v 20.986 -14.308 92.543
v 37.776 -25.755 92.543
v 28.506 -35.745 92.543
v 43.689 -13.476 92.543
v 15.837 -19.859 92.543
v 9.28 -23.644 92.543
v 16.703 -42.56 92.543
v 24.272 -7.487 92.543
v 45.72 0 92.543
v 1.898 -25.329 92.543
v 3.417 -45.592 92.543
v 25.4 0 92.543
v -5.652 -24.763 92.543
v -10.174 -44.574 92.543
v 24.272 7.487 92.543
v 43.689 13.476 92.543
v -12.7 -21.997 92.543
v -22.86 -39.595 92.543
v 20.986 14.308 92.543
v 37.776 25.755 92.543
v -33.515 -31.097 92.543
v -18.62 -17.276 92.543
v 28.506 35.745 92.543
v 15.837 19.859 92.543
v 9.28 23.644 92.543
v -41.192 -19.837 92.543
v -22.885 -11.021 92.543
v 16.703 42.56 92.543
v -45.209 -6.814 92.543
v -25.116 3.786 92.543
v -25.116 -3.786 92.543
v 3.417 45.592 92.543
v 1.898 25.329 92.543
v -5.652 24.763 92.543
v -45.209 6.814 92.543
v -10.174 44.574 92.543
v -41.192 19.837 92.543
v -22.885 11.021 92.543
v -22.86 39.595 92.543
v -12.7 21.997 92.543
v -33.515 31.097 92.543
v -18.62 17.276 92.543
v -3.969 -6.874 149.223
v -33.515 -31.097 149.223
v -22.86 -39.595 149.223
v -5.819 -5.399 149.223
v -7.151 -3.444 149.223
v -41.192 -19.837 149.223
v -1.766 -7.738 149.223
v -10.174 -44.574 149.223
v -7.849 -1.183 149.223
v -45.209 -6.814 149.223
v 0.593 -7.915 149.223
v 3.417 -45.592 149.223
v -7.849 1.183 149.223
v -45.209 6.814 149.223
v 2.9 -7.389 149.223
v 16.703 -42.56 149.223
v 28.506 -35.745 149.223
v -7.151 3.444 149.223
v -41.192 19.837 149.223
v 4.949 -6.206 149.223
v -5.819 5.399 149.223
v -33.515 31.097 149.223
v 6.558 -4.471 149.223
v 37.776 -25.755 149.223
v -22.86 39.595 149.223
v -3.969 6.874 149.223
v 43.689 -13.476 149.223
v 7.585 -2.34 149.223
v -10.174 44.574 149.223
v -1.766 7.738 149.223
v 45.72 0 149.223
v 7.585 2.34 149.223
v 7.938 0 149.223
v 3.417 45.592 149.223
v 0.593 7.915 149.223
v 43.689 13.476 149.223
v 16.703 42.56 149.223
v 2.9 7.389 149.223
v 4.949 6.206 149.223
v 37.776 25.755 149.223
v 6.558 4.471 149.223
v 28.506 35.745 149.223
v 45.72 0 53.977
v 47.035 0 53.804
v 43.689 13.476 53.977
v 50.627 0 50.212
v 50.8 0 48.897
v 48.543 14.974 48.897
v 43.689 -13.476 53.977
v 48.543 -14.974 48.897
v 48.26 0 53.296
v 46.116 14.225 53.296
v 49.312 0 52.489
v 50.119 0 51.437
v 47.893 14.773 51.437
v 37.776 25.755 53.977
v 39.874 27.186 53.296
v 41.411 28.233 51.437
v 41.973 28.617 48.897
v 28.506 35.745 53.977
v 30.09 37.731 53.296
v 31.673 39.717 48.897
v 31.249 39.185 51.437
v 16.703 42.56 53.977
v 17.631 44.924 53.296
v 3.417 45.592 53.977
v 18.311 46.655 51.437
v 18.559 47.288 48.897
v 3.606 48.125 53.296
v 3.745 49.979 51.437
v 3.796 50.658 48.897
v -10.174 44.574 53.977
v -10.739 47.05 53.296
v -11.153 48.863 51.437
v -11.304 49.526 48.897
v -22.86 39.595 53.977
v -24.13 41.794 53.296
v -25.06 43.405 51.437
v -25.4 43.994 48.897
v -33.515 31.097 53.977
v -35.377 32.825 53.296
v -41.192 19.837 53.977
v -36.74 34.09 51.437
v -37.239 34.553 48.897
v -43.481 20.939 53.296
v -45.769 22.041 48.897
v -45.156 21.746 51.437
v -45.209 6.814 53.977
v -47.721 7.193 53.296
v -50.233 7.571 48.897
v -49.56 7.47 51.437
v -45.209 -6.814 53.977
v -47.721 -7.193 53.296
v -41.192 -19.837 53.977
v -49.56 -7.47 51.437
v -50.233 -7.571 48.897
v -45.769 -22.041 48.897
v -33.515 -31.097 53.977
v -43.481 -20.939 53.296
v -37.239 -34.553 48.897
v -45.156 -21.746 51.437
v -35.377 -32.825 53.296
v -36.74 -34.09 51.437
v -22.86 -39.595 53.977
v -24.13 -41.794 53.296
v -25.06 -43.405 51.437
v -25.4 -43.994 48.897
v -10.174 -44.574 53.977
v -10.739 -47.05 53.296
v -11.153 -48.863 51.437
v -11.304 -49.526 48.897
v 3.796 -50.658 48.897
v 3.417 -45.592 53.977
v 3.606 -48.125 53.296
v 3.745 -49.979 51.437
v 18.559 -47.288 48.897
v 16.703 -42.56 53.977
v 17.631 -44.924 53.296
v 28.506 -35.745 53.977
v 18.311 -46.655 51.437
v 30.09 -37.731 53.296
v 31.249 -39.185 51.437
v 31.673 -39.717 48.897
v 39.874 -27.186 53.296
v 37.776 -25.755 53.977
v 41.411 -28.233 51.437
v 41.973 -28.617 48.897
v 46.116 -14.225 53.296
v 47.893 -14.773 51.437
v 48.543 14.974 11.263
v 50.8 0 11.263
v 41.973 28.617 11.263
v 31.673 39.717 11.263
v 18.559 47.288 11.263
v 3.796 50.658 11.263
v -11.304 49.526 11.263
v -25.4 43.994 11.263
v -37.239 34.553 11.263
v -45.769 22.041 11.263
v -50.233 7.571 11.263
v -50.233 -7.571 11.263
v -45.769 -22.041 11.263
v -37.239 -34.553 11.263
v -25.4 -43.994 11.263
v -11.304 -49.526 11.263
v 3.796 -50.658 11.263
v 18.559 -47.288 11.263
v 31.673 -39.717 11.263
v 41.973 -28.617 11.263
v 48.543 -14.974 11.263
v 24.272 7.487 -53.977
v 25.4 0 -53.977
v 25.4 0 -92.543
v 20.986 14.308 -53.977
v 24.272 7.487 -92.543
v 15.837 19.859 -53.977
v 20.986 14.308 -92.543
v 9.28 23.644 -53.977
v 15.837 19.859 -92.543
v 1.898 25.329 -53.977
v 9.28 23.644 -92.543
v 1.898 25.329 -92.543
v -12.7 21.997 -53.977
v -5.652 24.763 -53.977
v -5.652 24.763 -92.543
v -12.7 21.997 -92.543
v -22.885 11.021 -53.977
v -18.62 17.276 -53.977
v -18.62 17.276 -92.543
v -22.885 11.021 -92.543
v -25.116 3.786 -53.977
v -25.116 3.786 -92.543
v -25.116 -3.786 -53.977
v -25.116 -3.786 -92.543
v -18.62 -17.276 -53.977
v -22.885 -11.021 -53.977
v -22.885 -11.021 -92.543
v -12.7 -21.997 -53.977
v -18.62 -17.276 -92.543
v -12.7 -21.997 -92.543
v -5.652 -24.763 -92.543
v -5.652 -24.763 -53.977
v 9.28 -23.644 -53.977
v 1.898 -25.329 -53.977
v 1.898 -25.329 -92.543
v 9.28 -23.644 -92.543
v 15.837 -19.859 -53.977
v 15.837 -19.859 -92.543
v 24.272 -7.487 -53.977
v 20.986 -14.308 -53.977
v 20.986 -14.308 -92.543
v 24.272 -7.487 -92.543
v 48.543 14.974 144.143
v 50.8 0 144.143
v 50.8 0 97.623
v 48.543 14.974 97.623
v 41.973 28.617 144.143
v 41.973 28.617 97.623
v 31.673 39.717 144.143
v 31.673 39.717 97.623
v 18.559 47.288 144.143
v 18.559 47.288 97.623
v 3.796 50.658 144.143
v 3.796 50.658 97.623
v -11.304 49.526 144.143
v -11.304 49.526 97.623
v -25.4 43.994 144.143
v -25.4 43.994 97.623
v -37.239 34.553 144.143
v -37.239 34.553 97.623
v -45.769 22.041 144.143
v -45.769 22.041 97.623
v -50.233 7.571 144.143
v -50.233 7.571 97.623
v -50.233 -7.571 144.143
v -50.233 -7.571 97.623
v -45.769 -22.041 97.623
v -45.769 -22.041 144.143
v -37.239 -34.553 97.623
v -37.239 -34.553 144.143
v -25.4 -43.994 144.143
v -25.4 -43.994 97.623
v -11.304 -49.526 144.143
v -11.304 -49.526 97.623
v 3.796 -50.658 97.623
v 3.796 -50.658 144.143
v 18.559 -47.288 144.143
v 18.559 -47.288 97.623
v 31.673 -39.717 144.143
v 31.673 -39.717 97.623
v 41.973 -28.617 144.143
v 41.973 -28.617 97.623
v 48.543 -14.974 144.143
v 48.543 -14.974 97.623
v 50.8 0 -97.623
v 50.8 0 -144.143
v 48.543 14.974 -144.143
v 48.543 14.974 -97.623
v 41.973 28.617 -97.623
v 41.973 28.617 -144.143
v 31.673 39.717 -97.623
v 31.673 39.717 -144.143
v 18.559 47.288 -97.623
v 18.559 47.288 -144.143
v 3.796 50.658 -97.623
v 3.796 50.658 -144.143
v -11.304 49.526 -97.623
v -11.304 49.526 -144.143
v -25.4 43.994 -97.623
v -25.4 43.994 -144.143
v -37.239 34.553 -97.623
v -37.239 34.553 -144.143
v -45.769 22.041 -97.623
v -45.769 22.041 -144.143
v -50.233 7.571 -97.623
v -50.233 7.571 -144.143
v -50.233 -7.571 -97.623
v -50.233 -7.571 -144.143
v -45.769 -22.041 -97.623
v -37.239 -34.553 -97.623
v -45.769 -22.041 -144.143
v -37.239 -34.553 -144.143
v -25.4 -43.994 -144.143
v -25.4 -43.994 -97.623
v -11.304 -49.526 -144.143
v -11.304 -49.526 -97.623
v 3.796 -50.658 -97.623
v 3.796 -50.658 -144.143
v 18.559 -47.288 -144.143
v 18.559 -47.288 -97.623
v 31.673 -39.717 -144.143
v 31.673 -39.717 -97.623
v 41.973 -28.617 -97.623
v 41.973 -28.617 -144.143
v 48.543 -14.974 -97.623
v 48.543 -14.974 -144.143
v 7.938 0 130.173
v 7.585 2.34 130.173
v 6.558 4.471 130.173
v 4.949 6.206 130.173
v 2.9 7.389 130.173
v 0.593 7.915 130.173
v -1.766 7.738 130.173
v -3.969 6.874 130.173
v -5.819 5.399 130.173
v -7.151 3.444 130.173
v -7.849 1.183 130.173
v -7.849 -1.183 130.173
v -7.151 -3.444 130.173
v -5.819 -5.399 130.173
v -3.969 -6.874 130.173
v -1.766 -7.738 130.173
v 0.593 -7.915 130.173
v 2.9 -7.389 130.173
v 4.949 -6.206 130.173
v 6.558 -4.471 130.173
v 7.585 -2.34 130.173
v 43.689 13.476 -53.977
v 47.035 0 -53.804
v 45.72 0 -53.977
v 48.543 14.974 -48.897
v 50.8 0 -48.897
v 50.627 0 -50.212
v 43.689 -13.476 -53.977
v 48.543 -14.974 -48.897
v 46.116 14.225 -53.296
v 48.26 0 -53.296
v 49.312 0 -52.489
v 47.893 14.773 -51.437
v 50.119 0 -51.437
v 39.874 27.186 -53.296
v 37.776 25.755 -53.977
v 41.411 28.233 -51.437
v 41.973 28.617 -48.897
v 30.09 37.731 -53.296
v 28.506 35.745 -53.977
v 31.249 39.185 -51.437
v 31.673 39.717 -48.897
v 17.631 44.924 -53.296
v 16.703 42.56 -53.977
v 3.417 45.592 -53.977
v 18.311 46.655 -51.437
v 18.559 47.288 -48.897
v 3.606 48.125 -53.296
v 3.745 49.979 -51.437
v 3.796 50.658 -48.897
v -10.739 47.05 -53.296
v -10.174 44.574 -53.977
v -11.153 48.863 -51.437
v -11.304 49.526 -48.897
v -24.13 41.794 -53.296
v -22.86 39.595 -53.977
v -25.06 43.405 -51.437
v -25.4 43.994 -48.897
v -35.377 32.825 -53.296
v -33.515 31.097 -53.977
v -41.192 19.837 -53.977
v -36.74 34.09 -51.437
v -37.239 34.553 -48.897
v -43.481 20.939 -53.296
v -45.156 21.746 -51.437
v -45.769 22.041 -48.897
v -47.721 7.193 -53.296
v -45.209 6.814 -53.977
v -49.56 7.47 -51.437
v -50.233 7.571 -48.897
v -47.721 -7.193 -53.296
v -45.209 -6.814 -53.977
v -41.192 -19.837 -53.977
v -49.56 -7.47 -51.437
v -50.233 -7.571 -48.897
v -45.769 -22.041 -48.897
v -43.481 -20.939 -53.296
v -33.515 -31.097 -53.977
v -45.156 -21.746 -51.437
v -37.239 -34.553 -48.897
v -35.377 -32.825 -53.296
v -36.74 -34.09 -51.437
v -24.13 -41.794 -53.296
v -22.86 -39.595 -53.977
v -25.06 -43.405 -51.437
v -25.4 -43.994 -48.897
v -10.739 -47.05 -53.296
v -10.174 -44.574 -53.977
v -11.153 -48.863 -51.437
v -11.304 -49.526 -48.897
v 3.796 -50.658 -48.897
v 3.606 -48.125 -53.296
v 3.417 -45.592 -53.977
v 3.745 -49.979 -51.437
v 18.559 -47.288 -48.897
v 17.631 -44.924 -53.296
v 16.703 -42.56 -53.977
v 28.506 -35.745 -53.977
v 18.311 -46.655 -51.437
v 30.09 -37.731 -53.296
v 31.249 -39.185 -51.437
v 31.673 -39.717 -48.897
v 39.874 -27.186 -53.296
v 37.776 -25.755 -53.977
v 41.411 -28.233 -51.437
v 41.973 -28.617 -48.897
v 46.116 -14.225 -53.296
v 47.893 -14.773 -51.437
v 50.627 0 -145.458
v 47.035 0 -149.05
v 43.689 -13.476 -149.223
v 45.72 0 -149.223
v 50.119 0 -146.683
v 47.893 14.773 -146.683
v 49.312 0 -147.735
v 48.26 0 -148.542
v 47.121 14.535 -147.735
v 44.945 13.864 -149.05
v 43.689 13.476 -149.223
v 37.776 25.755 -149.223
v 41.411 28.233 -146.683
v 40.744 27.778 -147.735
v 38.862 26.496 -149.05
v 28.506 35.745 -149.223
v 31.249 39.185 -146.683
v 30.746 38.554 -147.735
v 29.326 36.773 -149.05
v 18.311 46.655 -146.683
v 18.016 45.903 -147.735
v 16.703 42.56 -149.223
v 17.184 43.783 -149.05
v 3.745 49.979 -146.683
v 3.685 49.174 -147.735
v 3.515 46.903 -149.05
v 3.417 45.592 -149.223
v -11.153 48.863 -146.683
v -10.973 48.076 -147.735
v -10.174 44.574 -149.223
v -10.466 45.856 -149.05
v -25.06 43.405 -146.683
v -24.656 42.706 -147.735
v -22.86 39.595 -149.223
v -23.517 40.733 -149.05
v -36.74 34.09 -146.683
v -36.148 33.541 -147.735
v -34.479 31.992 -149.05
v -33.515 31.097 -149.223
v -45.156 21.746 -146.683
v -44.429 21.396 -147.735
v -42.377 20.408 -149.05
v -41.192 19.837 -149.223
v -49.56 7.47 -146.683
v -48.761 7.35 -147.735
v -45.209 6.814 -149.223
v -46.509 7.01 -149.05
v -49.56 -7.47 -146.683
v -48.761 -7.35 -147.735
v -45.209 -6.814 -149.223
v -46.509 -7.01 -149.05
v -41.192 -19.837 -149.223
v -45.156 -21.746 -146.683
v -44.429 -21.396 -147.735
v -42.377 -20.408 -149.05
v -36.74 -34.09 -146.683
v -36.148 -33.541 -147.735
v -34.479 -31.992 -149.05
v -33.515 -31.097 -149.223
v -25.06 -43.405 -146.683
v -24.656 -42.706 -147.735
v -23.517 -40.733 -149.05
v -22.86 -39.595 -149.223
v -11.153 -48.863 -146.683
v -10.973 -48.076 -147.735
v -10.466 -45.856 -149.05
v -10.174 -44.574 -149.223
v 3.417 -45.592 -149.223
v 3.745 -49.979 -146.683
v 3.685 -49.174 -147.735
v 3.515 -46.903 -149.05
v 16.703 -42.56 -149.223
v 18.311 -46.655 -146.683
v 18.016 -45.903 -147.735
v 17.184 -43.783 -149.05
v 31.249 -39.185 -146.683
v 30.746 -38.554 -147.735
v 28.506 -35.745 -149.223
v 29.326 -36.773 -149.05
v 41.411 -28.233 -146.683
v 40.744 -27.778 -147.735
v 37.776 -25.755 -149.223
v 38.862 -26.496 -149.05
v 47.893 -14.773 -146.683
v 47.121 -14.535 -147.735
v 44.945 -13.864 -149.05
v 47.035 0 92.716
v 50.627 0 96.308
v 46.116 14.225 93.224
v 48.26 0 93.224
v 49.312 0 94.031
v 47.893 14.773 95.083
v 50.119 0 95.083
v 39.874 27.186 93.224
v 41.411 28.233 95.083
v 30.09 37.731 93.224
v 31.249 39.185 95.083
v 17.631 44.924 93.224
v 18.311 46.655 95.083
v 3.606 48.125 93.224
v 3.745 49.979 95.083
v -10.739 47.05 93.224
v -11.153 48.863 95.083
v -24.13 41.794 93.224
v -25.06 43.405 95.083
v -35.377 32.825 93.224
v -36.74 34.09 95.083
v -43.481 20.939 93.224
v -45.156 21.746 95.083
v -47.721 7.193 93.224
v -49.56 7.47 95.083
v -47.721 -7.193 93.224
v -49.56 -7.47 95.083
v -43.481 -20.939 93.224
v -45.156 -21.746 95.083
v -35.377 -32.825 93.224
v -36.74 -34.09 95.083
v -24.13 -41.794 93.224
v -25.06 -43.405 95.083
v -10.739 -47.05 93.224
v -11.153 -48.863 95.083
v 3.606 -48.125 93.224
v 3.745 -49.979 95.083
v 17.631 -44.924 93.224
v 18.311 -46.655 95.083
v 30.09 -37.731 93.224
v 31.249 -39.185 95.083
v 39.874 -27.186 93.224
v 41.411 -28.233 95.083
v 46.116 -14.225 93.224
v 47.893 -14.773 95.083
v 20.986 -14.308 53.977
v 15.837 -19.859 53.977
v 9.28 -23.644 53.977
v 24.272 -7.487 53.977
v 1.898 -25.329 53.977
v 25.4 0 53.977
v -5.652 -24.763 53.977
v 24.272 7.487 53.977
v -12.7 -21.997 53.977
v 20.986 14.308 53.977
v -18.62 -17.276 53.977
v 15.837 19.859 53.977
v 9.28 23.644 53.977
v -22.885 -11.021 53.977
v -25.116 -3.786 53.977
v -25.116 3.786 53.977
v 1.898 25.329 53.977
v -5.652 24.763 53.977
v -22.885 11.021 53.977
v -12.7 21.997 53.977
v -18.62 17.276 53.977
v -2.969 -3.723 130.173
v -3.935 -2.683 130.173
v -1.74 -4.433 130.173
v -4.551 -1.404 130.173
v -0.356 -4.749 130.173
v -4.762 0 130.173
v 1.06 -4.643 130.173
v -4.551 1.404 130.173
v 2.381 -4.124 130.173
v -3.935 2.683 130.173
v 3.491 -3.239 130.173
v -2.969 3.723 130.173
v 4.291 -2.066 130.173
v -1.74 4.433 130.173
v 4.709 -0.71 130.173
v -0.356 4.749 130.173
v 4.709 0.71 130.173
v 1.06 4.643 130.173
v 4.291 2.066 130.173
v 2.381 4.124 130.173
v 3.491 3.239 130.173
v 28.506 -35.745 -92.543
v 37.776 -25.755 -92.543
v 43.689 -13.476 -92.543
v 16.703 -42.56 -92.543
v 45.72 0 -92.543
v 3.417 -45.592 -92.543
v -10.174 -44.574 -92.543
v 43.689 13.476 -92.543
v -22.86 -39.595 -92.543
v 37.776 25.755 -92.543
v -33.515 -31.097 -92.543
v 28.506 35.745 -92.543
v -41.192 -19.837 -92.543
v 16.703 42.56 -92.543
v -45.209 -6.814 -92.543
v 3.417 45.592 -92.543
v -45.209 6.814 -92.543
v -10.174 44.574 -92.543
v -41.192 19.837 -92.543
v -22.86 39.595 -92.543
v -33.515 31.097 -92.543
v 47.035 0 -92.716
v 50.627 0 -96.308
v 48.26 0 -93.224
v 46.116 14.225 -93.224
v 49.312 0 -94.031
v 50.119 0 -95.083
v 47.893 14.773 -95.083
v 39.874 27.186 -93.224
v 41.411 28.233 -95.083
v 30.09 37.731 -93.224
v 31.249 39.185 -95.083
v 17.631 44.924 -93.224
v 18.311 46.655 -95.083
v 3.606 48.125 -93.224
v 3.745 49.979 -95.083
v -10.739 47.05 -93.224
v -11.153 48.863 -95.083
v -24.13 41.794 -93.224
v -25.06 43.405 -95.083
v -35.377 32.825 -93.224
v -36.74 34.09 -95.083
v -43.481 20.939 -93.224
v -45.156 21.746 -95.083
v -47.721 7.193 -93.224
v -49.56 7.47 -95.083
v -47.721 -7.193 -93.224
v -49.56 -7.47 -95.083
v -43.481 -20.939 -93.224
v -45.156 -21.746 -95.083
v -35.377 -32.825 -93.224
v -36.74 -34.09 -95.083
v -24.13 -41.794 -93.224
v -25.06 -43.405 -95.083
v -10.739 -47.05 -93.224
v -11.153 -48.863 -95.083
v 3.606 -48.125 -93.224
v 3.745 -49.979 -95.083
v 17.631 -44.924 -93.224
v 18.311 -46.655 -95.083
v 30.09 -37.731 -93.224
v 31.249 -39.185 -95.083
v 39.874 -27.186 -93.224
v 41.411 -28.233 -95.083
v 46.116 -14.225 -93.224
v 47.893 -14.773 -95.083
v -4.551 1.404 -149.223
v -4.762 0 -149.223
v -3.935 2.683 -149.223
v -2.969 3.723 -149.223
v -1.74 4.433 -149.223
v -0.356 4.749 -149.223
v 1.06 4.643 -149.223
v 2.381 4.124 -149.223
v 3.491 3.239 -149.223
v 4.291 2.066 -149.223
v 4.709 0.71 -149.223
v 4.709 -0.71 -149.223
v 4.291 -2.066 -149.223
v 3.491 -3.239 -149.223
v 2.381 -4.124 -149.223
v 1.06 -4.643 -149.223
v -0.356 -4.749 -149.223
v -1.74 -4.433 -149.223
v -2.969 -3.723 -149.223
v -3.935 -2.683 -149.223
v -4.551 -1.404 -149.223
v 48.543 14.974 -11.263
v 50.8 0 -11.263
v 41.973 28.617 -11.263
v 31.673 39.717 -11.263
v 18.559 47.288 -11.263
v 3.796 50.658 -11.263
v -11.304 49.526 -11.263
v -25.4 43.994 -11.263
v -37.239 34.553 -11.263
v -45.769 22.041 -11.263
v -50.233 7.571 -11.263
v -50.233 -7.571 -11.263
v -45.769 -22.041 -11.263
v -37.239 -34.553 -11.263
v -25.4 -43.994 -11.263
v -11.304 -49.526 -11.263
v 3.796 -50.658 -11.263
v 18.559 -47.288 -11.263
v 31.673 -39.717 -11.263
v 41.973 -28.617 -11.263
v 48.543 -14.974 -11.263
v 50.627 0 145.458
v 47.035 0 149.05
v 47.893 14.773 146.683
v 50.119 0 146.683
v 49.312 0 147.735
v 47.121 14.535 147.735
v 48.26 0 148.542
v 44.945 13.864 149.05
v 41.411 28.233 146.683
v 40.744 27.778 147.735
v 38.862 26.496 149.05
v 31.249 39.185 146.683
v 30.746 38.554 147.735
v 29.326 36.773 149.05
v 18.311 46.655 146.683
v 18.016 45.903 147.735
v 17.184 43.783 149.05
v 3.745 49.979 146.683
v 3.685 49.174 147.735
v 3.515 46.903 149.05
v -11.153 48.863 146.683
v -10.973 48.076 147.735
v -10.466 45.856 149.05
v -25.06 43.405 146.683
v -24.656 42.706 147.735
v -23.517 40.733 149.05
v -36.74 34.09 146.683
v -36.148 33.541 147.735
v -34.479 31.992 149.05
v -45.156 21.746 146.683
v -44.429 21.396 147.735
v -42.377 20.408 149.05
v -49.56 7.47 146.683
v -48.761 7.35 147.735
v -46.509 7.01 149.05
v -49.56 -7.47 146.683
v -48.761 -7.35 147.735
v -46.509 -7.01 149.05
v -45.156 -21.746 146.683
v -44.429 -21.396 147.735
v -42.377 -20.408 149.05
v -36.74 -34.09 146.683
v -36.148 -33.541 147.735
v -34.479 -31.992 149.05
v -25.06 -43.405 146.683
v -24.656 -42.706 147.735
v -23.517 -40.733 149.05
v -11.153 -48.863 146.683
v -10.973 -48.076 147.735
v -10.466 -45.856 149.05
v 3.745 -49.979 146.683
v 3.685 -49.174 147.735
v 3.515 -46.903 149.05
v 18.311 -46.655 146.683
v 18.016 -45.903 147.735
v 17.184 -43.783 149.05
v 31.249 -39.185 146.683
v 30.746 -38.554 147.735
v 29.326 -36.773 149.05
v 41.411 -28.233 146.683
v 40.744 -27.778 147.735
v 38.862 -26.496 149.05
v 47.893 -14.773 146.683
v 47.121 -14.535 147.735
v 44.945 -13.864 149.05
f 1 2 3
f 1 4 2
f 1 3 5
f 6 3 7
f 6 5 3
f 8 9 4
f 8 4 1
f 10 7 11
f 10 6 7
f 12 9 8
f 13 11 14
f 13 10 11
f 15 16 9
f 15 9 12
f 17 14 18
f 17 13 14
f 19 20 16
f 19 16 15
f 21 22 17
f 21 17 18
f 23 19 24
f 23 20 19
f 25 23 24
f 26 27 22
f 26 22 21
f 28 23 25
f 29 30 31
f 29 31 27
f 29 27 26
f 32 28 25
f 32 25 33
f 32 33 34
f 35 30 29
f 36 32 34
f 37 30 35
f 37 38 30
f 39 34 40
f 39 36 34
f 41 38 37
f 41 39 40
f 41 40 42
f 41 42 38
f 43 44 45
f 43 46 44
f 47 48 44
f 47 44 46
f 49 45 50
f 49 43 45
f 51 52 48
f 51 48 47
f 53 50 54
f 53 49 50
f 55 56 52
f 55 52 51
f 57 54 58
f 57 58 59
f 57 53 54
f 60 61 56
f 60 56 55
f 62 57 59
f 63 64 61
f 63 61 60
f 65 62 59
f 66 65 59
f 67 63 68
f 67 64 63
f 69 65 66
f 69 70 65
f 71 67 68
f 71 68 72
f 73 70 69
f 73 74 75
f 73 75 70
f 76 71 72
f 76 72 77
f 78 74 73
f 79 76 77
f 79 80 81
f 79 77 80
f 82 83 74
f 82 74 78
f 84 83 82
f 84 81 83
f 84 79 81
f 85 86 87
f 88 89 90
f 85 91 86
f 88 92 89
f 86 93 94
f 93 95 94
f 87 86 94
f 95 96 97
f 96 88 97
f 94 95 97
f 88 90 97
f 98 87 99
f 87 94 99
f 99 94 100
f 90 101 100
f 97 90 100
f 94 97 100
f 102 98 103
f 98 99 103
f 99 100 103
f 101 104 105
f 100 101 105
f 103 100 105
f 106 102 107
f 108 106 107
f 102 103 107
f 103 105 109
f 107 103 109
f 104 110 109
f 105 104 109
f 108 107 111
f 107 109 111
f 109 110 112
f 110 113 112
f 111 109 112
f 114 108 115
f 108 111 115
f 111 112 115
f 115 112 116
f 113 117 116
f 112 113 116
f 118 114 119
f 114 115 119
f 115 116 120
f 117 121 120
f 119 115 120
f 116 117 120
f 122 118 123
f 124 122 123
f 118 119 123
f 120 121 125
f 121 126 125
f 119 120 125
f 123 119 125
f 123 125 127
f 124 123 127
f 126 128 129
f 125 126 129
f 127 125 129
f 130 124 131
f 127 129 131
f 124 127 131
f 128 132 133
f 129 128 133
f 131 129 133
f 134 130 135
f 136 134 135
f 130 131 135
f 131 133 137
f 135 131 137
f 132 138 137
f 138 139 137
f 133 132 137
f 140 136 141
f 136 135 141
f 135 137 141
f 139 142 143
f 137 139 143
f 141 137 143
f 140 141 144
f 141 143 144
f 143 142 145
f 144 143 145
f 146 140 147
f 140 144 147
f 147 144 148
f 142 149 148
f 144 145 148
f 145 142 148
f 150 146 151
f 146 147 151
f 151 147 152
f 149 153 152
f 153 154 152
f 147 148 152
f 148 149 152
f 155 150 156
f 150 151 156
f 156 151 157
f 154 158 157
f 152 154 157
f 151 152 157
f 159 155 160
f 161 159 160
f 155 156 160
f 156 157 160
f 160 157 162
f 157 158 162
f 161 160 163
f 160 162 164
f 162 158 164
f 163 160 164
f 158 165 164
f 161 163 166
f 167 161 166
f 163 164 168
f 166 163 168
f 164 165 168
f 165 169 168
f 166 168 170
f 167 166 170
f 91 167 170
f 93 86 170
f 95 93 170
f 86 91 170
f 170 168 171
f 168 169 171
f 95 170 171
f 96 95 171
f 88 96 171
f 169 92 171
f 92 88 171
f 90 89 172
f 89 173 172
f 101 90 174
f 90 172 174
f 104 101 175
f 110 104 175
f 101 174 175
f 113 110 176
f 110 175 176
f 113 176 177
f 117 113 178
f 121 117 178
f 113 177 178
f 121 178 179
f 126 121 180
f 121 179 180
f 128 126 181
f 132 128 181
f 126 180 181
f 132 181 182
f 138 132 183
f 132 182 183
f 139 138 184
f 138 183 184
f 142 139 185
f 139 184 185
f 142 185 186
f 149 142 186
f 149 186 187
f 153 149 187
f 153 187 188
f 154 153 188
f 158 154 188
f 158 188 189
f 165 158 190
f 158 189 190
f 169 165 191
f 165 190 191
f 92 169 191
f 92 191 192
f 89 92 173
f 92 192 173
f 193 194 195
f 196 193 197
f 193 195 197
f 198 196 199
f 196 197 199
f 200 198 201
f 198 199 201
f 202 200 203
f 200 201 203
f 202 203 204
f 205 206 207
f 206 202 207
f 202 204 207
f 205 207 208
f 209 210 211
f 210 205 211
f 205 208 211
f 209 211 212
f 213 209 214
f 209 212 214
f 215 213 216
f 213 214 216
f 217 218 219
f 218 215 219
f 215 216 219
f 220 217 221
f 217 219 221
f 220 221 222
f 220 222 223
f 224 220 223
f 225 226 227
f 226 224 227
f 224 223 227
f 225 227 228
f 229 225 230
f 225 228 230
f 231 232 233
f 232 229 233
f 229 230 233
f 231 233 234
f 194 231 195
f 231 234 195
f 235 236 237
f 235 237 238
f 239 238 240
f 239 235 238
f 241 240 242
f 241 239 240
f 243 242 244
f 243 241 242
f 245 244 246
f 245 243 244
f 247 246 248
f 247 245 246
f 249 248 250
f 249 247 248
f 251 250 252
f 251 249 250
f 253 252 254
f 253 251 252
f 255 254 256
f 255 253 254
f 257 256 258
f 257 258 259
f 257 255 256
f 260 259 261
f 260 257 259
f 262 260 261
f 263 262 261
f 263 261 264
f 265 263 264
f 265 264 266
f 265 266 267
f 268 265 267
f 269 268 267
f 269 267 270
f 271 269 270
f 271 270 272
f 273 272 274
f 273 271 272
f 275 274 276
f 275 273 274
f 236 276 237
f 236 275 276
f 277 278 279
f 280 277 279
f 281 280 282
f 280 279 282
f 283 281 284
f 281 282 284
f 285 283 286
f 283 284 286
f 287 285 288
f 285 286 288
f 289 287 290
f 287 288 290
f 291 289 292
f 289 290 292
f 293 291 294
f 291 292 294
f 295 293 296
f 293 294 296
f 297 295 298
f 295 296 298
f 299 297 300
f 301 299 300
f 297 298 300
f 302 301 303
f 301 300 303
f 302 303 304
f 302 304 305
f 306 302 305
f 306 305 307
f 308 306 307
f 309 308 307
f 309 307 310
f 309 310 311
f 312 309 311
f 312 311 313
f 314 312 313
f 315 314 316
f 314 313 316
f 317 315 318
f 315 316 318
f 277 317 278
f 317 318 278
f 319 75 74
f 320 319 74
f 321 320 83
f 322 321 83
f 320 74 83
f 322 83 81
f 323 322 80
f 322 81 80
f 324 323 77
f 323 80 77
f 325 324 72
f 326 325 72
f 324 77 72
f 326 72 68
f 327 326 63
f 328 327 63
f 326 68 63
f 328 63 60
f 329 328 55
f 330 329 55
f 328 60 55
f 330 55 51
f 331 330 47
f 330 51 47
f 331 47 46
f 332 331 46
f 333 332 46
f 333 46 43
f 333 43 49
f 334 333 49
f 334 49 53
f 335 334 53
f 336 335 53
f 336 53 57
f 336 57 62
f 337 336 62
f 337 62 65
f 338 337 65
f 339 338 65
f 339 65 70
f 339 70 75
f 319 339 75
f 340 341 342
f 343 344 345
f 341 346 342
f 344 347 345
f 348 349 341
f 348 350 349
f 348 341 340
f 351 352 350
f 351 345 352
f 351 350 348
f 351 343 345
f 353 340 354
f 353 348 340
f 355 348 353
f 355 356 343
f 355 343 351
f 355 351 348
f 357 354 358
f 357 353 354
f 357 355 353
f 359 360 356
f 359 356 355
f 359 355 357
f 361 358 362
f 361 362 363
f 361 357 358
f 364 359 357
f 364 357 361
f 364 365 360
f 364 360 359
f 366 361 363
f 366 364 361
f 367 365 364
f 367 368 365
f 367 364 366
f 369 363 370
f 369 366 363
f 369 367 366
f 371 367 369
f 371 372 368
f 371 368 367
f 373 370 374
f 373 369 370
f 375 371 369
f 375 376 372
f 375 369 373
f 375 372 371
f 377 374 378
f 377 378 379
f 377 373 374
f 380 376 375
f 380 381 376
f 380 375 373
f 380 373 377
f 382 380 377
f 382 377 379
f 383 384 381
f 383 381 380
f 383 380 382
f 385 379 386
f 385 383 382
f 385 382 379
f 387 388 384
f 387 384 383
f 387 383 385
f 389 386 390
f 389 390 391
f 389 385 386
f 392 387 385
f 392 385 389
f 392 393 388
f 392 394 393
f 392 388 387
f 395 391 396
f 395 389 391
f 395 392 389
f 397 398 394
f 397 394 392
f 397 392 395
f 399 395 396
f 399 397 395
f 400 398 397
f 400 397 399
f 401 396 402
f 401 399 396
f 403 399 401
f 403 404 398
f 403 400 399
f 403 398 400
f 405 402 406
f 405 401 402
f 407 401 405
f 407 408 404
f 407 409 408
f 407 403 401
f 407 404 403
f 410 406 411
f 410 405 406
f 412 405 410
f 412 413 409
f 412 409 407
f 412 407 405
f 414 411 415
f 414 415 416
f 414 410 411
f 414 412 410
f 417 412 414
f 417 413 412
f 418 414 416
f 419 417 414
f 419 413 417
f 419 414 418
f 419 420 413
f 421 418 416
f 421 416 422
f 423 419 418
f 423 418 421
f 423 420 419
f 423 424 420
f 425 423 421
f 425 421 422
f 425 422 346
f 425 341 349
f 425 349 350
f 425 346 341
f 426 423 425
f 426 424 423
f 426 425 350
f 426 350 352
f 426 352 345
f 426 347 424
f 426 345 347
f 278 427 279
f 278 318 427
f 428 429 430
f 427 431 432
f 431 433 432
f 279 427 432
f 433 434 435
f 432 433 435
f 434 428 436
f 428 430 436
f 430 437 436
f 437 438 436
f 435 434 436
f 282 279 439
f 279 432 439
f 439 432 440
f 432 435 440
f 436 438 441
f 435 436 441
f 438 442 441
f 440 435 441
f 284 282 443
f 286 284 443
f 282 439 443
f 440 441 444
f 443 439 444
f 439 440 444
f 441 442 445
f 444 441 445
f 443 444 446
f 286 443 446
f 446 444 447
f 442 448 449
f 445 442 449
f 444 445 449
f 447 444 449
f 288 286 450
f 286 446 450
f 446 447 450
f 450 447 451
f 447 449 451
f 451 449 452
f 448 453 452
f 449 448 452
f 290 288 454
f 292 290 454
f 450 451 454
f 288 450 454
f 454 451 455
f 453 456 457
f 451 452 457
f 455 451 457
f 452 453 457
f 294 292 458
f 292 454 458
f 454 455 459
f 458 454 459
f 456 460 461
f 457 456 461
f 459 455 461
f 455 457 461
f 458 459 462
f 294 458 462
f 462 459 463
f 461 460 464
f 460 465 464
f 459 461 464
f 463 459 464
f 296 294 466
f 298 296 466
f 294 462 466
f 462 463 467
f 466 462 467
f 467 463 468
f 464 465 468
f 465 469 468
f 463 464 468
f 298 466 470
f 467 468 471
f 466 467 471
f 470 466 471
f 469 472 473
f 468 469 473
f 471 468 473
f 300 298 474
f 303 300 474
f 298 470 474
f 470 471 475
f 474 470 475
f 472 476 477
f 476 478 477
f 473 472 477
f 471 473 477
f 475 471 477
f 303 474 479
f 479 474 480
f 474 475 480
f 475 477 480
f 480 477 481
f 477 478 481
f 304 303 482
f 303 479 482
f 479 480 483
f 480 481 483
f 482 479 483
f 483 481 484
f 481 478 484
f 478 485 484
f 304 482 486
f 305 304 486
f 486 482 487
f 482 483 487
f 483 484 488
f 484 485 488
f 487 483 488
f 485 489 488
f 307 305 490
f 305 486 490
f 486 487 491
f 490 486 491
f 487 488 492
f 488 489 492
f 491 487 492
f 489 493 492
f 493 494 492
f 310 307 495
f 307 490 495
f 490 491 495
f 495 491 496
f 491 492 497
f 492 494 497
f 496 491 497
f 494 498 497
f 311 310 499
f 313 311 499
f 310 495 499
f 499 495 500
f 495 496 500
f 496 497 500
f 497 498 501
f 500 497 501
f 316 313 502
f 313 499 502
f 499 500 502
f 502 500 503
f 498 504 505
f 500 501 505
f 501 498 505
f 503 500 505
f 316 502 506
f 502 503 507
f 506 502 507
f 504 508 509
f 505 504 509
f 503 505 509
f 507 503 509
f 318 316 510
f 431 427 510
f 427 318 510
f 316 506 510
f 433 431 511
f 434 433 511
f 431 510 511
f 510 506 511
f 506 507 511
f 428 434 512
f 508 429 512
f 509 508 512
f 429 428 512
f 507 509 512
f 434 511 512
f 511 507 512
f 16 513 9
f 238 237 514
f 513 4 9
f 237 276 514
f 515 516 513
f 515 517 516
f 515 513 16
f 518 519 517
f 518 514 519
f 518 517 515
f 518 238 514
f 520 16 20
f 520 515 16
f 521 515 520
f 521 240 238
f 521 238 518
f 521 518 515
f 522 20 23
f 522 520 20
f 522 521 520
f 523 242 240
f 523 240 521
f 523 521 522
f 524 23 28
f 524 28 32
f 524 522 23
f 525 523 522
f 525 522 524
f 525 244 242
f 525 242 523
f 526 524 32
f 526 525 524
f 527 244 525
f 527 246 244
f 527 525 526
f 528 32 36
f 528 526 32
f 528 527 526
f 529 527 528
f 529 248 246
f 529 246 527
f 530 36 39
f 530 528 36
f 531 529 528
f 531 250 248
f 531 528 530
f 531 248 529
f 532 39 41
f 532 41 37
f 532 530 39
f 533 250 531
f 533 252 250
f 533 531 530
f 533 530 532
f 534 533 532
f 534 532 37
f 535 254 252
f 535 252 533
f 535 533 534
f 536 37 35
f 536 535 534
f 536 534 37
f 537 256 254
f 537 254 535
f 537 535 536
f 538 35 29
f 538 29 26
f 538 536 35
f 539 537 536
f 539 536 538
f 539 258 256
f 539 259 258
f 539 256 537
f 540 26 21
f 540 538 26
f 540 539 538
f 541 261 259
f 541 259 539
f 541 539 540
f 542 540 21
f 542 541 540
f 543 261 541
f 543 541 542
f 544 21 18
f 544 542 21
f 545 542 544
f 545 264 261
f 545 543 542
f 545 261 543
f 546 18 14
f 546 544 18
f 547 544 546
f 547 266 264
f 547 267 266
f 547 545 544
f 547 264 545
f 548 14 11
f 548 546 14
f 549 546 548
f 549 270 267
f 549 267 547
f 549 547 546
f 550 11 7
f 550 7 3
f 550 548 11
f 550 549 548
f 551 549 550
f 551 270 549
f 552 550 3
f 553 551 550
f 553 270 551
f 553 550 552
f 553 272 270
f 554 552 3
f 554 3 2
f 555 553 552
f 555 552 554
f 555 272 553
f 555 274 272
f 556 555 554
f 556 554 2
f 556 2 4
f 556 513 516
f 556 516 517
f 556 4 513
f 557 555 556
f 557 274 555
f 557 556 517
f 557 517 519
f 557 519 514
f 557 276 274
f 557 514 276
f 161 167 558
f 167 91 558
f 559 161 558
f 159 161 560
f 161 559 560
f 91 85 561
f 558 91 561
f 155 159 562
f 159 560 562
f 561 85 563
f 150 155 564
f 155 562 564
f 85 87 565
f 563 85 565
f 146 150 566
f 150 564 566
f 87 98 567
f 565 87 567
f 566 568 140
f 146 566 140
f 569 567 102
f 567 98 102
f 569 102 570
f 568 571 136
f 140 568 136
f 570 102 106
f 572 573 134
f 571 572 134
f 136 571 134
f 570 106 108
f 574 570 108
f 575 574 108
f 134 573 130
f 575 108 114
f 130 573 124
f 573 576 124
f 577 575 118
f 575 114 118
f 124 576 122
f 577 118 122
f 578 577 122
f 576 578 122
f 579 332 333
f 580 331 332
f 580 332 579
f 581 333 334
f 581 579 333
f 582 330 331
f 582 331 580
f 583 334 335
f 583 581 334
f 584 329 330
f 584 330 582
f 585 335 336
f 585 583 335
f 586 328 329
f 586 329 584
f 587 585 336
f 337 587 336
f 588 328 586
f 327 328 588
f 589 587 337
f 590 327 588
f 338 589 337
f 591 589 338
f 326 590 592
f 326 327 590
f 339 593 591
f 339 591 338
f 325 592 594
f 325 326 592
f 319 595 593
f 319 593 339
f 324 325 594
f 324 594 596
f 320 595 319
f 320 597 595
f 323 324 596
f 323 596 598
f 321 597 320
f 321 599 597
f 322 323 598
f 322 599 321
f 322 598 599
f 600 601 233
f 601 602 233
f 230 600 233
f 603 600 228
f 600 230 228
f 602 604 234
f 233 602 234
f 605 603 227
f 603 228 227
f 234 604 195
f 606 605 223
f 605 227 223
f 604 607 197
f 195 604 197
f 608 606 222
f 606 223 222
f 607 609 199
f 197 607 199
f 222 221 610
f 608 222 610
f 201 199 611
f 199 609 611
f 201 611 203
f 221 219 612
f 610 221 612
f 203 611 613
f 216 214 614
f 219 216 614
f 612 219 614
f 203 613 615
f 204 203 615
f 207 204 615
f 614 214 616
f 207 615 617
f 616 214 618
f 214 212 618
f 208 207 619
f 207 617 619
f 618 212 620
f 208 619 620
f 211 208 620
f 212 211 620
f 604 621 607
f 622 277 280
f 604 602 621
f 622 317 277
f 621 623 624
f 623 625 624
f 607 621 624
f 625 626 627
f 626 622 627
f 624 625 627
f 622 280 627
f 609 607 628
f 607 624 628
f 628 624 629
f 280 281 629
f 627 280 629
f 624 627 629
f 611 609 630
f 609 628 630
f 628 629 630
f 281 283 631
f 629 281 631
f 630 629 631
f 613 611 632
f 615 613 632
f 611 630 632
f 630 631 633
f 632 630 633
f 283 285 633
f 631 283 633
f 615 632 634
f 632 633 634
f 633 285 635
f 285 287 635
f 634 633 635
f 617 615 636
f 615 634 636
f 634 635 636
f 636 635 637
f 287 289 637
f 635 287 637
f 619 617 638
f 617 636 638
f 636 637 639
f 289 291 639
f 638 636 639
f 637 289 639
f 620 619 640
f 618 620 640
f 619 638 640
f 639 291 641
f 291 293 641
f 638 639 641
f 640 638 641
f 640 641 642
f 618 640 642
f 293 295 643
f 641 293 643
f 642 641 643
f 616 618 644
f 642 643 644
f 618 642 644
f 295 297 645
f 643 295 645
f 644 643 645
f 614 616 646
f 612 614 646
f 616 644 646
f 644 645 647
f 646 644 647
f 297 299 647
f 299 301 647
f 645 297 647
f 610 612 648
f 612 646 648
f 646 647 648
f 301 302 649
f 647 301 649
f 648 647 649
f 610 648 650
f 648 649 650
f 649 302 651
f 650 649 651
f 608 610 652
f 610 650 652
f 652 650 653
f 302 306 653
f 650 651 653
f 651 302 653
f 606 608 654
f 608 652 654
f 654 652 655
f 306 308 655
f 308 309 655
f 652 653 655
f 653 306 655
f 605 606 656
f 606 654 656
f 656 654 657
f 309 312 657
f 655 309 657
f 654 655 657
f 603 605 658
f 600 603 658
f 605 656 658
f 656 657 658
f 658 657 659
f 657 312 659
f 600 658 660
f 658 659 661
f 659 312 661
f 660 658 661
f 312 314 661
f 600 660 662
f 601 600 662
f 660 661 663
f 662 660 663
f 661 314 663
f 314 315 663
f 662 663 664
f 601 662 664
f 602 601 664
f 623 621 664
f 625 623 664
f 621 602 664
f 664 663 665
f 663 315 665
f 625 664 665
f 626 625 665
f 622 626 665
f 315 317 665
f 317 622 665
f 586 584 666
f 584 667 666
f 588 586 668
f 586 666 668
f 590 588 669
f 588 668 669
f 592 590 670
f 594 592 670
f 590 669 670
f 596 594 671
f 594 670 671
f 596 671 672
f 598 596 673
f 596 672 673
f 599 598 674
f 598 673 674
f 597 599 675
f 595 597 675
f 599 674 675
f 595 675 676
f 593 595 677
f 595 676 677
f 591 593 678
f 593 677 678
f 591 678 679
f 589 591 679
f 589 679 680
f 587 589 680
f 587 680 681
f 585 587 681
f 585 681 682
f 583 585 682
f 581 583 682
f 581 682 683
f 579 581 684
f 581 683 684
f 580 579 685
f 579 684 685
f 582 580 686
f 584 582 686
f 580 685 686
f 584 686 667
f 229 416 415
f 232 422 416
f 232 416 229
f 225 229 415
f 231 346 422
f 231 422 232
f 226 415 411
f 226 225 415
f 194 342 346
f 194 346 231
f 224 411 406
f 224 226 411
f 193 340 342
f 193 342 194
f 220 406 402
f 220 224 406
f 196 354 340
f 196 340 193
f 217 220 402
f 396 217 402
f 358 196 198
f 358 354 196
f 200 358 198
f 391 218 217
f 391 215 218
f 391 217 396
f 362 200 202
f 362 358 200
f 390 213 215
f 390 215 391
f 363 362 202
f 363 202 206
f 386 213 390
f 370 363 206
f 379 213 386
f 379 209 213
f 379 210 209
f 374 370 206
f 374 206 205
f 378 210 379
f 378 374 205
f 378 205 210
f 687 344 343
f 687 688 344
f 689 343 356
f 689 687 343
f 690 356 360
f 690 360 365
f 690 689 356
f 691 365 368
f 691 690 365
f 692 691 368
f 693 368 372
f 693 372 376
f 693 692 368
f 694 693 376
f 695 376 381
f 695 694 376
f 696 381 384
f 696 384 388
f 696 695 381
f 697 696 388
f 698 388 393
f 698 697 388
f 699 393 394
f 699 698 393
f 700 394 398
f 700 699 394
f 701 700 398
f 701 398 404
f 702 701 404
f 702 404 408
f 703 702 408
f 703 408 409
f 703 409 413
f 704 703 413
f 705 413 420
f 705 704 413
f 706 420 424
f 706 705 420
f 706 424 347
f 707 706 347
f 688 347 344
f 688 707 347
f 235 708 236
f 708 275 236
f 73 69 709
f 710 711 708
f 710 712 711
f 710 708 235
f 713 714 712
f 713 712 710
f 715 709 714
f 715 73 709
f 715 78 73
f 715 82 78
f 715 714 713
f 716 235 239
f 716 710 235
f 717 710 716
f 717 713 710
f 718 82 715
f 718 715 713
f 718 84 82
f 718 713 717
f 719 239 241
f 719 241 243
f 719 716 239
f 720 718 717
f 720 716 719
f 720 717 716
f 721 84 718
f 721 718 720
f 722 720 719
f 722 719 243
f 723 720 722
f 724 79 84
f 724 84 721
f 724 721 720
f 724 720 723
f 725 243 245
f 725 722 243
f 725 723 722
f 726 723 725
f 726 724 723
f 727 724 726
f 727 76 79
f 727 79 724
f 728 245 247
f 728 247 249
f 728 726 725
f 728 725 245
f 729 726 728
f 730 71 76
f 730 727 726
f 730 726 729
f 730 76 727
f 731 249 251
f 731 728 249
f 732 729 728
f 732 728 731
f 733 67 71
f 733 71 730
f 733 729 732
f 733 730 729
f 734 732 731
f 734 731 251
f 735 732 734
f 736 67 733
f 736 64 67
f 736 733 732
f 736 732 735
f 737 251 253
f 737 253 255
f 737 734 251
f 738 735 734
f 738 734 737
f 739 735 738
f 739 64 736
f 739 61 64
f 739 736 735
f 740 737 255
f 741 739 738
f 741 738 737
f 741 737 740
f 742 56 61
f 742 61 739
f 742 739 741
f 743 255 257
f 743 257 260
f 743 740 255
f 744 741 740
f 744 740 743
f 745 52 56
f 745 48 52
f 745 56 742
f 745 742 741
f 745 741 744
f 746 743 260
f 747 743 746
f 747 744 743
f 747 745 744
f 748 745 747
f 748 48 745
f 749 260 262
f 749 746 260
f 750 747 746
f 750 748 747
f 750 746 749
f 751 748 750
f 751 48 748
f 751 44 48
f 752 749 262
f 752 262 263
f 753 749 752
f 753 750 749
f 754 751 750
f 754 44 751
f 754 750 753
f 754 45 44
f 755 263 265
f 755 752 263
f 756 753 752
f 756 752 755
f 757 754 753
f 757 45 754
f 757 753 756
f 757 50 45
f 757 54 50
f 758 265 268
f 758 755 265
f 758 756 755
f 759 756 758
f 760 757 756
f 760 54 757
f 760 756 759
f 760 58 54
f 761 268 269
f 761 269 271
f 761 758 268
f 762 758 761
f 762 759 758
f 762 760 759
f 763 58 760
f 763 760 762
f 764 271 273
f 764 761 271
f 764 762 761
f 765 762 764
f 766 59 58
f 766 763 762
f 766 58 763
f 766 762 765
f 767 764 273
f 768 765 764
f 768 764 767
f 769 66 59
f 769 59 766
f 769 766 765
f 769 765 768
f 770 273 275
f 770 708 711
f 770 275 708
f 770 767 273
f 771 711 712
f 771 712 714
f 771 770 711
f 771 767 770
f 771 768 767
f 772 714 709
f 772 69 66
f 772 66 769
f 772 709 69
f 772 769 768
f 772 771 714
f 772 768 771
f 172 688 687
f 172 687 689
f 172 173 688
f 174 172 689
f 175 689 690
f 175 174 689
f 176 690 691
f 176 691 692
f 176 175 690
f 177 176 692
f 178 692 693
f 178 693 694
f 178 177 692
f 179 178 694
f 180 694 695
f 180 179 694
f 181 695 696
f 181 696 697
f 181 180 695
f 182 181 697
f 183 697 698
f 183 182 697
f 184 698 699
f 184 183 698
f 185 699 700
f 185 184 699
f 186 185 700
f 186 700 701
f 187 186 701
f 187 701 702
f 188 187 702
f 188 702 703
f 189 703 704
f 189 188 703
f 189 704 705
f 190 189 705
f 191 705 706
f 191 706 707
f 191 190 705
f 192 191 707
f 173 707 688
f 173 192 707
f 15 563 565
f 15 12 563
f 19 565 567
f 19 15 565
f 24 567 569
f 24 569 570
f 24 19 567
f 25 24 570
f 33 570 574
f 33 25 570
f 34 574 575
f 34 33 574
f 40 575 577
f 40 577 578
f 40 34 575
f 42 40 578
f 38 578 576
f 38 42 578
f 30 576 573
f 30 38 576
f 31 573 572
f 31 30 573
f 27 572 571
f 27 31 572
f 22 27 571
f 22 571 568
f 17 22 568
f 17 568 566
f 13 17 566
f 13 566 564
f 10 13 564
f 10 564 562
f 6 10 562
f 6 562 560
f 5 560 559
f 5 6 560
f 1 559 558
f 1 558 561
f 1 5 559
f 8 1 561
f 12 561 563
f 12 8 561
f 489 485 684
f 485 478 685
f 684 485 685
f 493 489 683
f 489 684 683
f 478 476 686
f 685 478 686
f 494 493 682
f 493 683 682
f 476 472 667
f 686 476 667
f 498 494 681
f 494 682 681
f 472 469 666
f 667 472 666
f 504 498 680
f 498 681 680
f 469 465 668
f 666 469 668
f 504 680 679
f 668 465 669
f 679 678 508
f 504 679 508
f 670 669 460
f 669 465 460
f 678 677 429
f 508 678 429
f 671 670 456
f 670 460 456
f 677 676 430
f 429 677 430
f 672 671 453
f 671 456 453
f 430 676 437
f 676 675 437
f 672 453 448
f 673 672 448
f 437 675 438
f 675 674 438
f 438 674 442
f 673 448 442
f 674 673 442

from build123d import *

# Parameters (mm, degrees)
F2_R           = 5.08
F5_D           = 9.525
F5_CBORE_D     = 15.875
F5_CBORE_DEPTH = 19.05


with BuildPart() as f1:
    # F0 (on Front) → F1 (revolve)
    with BuildSketch(Plane.XZ):
        Polygon((0, -53.9769612057), (50.8, -53.9769612057), (50.8, 16.3429528475), (25.4, 16.3429528475), (25.4, 92.5429528475), (50.8, 92.5429528475), (50.8, 149.2230387943), (0, 149.2230387943), align=None)
    revolve(axis=Axis((0, 0, 47.6230387943), (0, 0, 1)))

    # F2
    f2_edges = [f1.edges().sort_by_distance(p)[0] for p in [
        (-50.8, 0, -53.976961),
        (-50.8, 0, 16.342953),
        (-50.8, 0, 149.223039),
        (-50.8, 0, 92.542953),
    ]]
    fillet(f2_edges, radius=F2_R)

    # F3: F1 across plane


with BuildPart() as f1_1:
    add(f1.part)
    add(f1.part.mirror(Plane.XY))

    # F5 (through all)
    with Locations(Plane.XY.offset(149.2230387943)):
        with Locations((0, 0)):
            CounterBoreHole(F5_D / 2, F5_CBORE_D / 2, F5_CBORE_DEPTH)


solid = f1_1.part
